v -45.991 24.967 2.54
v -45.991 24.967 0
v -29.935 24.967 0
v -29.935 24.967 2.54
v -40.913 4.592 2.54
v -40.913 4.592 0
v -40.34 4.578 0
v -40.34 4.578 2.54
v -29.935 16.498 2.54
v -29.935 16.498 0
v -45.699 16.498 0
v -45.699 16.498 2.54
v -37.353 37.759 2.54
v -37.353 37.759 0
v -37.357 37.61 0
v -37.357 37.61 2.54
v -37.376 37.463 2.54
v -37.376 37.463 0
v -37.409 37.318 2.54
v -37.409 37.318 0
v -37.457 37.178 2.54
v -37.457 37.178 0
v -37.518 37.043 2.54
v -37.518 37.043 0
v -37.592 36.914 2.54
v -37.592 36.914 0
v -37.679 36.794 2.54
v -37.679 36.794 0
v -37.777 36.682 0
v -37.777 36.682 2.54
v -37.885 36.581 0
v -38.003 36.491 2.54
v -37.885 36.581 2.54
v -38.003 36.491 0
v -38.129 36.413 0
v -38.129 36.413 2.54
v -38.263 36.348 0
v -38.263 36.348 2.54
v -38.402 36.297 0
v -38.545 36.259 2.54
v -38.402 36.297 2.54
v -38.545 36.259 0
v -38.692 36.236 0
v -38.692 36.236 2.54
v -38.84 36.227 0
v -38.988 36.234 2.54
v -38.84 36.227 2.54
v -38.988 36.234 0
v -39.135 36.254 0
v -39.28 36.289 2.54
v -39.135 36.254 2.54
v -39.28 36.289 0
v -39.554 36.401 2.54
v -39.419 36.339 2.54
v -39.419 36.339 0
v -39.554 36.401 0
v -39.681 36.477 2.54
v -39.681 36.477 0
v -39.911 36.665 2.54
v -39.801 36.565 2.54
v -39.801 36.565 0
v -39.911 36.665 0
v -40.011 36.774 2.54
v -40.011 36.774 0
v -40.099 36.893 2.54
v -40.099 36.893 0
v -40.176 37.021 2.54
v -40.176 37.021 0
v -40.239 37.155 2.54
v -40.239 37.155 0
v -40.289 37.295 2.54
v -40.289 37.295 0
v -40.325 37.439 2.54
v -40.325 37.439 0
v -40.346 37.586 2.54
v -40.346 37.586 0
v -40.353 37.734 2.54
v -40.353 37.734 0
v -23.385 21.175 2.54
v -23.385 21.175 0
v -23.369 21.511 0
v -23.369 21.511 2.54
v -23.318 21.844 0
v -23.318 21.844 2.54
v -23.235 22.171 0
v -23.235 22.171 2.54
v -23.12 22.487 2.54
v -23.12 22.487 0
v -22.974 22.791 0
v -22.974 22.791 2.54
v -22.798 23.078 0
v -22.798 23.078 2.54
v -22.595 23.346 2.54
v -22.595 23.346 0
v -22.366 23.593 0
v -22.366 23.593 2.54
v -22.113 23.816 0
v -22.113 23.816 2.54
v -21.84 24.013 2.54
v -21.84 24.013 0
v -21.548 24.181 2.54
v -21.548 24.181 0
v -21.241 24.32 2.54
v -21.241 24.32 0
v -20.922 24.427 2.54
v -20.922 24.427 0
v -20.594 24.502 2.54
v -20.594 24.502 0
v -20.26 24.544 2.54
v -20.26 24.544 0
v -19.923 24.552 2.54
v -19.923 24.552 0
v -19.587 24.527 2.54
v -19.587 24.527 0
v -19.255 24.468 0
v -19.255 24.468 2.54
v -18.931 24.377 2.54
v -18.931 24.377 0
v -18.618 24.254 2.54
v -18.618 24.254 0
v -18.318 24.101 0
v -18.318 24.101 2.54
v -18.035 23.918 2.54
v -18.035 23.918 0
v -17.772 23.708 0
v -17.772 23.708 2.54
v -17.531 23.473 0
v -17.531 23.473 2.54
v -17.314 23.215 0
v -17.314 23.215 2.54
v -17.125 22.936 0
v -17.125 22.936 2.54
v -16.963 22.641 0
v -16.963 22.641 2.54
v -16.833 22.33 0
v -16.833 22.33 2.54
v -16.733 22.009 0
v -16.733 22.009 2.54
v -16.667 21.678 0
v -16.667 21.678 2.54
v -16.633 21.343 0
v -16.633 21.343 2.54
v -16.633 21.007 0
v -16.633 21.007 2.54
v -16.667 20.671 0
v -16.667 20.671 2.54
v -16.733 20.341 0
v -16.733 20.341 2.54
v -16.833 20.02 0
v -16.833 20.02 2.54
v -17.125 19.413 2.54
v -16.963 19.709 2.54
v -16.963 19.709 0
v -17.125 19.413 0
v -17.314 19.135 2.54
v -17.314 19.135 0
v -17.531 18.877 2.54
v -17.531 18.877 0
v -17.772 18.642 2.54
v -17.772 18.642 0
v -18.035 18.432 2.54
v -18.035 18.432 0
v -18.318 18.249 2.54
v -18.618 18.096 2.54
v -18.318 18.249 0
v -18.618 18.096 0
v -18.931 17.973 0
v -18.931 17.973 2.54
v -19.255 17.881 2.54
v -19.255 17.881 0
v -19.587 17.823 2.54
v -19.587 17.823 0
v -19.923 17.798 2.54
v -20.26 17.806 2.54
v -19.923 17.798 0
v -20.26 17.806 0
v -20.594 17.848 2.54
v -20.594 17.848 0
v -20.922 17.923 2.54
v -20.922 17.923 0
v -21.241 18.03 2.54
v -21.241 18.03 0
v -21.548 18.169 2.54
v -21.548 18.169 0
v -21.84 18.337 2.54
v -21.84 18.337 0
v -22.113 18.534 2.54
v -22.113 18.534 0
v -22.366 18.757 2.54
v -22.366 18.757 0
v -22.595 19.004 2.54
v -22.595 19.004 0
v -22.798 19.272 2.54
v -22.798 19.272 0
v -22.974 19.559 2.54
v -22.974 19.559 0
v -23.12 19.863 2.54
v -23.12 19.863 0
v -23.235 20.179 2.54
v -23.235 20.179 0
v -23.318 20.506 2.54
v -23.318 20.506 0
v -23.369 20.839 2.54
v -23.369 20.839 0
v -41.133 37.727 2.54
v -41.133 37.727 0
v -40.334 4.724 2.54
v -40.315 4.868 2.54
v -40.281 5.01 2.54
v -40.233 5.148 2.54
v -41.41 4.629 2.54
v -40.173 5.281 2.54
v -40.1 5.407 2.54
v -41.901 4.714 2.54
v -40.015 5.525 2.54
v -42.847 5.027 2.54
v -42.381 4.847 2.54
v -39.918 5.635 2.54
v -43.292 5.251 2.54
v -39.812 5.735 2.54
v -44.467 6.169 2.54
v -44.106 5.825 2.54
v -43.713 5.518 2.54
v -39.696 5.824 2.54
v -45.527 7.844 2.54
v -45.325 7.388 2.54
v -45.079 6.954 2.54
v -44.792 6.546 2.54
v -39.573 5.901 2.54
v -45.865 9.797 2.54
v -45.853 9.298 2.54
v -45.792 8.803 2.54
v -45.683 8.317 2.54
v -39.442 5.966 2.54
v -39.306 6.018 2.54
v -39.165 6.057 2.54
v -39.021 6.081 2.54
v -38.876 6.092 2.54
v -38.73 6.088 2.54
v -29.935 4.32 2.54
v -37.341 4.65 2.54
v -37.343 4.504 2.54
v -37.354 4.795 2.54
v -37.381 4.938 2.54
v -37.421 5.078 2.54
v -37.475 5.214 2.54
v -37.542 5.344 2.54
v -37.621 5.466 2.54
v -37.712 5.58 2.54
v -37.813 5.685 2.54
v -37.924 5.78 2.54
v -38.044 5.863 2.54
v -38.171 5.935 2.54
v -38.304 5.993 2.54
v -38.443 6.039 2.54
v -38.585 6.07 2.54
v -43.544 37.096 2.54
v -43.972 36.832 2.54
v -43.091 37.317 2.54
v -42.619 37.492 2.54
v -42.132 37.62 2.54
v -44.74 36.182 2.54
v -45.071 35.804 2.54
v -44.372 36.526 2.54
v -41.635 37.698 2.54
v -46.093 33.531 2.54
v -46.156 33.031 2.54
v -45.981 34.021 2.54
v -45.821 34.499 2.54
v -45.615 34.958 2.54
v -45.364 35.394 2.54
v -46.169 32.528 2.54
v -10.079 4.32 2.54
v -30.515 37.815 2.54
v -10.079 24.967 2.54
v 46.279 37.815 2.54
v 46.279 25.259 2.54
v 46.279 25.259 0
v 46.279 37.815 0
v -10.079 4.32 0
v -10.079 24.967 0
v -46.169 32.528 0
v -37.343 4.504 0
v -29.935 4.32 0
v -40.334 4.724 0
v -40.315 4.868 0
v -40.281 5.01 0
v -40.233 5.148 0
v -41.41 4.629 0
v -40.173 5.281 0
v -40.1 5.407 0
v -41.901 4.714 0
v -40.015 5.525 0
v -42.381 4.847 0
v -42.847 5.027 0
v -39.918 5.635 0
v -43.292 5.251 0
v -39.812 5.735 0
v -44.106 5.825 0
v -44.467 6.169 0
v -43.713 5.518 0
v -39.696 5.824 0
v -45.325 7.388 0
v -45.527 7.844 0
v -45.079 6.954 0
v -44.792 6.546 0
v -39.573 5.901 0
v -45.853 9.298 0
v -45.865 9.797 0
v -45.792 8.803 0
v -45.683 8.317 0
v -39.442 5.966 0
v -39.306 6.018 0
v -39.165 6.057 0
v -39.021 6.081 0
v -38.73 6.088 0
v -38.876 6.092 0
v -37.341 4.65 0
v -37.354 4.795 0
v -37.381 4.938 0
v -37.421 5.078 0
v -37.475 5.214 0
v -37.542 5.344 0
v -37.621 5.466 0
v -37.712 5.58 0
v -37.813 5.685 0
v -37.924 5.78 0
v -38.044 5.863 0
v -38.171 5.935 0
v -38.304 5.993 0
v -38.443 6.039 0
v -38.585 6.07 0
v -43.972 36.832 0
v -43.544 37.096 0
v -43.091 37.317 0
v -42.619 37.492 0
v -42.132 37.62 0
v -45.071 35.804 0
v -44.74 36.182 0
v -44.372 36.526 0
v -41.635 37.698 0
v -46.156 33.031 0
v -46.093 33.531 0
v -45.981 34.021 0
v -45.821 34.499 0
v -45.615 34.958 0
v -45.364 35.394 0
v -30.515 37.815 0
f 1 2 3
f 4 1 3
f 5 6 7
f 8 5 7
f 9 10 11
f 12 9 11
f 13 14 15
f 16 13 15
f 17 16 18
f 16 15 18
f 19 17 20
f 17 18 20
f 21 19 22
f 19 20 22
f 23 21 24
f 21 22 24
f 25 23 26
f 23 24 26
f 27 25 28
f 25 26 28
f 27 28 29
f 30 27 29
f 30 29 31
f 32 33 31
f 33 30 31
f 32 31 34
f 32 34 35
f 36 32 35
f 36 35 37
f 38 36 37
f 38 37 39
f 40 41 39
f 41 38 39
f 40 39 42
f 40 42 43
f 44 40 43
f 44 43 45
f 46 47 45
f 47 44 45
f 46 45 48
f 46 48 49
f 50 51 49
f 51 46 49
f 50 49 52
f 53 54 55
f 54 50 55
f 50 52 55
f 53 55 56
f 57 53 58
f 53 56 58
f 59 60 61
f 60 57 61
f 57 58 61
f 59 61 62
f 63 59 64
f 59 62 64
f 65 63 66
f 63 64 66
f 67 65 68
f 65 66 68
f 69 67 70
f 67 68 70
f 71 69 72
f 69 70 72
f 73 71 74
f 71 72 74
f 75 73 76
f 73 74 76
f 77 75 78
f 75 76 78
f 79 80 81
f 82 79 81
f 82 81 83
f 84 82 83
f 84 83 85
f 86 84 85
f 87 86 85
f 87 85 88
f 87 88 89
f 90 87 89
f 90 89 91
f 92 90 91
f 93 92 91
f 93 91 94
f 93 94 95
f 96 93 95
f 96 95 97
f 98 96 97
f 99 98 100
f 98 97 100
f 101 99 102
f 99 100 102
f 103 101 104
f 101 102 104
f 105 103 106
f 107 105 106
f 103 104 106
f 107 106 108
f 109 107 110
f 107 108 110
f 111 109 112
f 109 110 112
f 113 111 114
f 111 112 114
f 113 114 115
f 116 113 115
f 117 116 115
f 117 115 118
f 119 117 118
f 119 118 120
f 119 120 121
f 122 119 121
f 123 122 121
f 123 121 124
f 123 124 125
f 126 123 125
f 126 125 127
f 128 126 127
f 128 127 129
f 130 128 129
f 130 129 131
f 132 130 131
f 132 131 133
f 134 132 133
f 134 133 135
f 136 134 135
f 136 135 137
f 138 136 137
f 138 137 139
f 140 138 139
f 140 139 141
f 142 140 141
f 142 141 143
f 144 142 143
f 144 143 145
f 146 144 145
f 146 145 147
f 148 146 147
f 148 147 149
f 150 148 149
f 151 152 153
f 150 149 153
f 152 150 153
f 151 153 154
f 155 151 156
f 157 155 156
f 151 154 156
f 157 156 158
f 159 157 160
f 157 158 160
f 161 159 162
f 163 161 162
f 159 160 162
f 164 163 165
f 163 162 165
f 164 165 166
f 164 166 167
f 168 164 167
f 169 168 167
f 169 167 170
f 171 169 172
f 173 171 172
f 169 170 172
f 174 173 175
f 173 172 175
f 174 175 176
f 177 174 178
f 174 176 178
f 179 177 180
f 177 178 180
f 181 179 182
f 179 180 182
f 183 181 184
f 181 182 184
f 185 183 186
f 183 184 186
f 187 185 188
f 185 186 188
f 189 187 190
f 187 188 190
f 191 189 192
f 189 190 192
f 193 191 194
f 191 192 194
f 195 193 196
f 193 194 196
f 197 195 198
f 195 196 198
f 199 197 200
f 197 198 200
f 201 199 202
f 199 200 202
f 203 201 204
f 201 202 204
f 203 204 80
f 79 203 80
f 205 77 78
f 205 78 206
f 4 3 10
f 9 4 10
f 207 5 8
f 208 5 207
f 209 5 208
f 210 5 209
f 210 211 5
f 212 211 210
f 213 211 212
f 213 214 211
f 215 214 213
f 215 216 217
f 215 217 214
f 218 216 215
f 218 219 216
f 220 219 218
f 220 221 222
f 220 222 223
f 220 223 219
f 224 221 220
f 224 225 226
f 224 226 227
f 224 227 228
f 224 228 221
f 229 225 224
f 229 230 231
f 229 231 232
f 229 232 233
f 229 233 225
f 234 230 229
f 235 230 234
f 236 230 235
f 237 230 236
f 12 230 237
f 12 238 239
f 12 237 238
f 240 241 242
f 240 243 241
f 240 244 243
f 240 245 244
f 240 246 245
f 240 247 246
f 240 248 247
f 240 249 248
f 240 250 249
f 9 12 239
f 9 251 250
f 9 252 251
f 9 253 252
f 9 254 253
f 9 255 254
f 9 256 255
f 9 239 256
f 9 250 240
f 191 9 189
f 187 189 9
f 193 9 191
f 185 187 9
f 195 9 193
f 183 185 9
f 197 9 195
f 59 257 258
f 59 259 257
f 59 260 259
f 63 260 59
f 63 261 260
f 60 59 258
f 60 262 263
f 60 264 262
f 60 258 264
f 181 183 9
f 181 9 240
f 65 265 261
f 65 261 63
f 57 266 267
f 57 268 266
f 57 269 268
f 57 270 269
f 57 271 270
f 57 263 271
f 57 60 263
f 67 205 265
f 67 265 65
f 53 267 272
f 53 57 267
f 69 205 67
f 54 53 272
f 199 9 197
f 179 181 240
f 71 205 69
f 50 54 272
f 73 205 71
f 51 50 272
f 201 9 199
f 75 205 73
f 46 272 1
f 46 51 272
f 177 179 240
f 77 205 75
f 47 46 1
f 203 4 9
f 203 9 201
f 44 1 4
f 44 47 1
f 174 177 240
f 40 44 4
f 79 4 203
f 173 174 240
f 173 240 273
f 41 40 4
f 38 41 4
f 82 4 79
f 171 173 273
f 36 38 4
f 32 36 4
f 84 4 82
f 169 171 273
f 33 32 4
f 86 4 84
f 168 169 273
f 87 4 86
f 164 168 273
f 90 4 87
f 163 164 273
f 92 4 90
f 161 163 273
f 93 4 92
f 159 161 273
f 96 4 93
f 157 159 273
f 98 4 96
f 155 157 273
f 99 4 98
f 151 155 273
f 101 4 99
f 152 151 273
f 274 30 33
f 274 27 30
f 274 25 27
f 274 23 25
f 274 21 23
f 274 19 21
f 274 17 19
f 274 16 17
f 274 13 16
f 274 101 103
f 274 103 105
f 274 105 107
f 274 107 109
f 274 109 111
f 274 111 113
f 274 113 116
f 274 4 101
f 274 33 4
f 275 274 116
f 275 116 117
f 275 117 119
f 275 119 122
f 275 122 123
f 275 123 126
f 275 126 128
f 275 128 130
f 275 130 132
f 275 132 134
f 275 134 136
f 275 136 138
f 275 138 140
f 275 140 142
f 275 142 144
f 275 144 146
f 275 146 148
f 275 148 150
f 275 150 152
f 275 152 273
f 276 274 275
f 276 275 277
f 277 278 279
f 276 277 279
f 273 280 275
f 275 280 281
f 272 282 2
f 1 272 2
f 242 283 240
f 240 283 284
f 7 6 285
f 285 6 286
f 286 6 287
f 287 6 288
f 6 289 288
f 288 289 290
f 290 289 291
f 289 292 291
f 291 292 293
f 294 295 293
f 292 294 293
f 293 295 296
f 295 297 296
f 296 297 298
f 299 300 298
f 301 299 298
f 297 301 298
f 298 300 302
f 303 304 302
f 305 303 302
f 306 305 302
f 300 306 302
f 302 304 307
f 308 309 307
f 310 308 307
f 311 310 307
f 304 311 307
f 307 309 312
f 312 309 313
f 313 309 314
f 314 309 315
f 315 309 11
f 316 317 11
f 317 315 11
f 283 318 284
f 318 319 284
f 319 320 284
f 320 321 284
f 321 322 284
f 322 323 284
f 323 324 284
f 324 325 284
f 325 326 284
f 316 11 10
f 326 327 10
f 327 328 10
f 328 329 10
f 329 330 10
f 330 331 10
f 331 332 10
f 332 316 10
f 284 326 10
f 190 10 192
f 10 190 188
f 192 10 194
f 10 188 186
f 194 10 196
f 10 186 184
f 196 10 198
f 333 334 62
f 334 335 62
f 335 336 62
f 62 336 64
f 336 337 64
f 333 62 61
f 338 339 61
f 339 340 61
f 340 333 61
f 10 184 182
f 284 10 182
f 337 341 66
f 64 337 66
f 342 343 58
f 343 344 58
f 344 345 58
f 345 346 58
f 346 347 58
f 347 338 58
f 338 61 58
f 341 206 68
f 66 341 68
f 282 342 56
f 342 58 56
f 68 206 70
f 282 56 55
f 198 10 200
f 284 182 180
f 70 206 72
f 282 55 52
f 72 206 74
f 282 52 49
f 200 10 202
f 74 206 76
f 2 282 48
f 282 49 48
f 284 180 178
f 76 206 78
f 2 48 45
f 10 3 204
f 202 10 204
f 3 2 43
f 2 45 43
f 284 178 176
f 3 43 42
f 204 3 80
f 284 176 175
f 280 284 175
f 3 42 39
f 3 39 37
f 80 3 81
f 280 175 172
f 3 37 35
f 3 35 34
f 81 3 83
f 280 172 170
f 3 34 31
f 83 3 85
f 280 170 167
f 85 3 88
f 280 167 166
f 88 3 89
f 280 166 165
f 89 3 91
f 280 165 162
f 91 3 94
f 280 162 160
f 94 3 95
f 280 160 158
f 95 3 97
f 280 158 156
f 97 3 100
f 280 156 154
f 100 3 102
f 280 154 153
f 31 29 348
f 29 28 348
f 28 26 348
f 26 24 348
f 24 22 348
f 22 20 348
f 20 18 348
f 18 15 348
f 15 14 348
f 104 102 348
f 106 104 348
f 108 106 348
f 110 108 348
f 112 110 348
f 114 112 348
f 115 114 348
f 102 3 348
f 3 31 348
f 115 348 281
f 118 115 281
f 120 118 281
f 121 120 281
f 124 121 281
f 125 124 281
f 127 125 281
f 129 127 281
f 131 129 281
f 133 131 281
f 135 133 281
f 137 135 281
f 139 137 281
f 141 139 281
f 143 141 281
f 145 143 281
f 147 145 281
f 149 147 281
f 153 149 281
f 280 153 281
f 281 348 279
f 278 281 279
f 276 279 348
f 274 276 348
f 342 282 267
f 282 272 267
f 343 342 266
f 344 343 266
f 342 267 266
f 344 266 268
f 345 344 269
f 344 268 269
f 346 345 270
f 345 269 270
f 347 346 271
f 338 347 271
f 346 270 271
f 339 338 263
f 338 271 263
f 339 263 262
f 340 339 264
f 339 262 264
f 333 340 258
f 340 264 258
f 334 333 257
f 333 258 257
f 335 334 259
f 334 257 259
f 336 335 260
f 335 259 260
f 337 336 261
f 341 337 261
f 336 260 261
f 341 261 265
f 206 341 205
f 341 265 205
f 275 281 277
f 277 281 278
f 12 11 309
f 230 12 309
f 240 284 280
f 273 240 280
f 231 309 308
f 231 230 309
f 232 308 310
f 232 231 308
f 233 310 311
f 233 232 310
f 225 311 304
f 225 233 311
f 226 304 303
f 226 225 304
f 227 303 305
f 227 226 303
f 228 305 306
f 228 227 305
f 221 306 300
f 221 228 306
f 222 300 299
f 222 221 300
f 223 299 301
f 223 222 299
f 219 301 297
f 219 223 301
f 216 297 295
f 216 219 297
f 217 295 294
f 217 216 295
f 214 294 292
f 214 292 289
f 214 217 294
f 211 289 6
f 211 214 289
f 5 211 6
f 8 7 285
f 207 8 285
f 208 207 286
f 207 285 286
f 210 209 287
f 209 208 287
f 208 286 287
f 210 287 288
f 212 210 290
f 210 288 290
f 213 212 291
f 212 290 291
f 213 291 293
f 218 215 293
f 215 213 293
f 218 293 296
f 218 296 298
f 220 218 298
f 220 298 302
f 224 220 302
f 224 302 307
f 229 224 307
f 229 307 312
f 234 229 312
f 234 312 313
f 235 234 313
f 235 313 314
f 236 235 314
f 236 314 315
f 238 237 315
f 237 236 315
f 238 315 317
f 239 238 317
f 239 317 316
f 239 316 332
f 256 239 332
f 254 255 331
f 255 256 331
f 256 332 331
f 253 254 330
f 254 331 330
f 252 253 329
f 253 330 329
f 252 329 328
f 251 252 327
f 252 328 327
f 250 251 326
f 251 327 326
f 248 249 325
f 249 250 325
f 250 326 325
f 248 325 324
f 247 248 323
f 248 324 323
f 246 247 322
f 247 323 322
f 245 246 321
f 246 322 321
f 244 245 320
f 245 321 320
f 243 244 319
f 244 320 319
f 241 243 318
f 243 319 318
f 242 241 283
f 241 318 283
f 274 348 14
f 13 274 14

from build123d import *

# Parameters (mm, degrees)
F1_DEPTH = 2.54
F3_D     = 6.7564
F4_R     = 5.08
F5_R     = 5.08
F7_D     = 3
F9_D     = 3


with BuildPart() as f1:
    # F0 (on Top) → F1 (new body)
    with BuildSketch(Plane.XY):
        Polygon((-46.2908484042, 37.6848205924), (-45.9911487997, 24.9666236341), (-29.9353669436, 24.9666236341), (-29.9353669436, 16.4984129369), (-45.6991419196, 16.4984129369), (-45.9911487997, 4.7181551345), (-29.9353669436, 4.3201673446), (-10.0788730235, 4.3201673446), (-10.0788730235, 24.9666236341), (46.2785349189, 25.2586323768), (46.2785349189, 37.8149449825), (-30.5147636682, 37.8149449825), align=None)
    extrude(amount=F1_DEPTH)

    # F3 (through all)
    with Locations(Plane.XY.offset(2.54)):
        with Locations((-20.0071199835, 21.1749691516)):
            Hole(F3_D / 2)

    # F4
    f4_edges = [f1.edges().sort_by_distance(p)[0] for p in [
        (-45.991149, 4.718155, 1.27),
    ]]
    fillet(f4_edges, radius=F4_R)

    # F5
    f5_edges = [f1.edges().sort_by_distance(p)[0] for p in [
        (-46.290848, 37.684821, 1.27),
    ]]
    fillet(f5_edges, radius=F5_R)

    # F7 (through all)
    with Locations(Plane.XY.offset(2.54)):
        with Locations((-38.8525593063, 37.7273665891)):
            Hole(F7_D / 2)

    # F9 (through all)
    with Locations(Plane.XY.offset(2.54)):
        with Locations((-38.8401874188, 4.5922716895)):
            Hole(F9_D / 2)


solid = f1.part
